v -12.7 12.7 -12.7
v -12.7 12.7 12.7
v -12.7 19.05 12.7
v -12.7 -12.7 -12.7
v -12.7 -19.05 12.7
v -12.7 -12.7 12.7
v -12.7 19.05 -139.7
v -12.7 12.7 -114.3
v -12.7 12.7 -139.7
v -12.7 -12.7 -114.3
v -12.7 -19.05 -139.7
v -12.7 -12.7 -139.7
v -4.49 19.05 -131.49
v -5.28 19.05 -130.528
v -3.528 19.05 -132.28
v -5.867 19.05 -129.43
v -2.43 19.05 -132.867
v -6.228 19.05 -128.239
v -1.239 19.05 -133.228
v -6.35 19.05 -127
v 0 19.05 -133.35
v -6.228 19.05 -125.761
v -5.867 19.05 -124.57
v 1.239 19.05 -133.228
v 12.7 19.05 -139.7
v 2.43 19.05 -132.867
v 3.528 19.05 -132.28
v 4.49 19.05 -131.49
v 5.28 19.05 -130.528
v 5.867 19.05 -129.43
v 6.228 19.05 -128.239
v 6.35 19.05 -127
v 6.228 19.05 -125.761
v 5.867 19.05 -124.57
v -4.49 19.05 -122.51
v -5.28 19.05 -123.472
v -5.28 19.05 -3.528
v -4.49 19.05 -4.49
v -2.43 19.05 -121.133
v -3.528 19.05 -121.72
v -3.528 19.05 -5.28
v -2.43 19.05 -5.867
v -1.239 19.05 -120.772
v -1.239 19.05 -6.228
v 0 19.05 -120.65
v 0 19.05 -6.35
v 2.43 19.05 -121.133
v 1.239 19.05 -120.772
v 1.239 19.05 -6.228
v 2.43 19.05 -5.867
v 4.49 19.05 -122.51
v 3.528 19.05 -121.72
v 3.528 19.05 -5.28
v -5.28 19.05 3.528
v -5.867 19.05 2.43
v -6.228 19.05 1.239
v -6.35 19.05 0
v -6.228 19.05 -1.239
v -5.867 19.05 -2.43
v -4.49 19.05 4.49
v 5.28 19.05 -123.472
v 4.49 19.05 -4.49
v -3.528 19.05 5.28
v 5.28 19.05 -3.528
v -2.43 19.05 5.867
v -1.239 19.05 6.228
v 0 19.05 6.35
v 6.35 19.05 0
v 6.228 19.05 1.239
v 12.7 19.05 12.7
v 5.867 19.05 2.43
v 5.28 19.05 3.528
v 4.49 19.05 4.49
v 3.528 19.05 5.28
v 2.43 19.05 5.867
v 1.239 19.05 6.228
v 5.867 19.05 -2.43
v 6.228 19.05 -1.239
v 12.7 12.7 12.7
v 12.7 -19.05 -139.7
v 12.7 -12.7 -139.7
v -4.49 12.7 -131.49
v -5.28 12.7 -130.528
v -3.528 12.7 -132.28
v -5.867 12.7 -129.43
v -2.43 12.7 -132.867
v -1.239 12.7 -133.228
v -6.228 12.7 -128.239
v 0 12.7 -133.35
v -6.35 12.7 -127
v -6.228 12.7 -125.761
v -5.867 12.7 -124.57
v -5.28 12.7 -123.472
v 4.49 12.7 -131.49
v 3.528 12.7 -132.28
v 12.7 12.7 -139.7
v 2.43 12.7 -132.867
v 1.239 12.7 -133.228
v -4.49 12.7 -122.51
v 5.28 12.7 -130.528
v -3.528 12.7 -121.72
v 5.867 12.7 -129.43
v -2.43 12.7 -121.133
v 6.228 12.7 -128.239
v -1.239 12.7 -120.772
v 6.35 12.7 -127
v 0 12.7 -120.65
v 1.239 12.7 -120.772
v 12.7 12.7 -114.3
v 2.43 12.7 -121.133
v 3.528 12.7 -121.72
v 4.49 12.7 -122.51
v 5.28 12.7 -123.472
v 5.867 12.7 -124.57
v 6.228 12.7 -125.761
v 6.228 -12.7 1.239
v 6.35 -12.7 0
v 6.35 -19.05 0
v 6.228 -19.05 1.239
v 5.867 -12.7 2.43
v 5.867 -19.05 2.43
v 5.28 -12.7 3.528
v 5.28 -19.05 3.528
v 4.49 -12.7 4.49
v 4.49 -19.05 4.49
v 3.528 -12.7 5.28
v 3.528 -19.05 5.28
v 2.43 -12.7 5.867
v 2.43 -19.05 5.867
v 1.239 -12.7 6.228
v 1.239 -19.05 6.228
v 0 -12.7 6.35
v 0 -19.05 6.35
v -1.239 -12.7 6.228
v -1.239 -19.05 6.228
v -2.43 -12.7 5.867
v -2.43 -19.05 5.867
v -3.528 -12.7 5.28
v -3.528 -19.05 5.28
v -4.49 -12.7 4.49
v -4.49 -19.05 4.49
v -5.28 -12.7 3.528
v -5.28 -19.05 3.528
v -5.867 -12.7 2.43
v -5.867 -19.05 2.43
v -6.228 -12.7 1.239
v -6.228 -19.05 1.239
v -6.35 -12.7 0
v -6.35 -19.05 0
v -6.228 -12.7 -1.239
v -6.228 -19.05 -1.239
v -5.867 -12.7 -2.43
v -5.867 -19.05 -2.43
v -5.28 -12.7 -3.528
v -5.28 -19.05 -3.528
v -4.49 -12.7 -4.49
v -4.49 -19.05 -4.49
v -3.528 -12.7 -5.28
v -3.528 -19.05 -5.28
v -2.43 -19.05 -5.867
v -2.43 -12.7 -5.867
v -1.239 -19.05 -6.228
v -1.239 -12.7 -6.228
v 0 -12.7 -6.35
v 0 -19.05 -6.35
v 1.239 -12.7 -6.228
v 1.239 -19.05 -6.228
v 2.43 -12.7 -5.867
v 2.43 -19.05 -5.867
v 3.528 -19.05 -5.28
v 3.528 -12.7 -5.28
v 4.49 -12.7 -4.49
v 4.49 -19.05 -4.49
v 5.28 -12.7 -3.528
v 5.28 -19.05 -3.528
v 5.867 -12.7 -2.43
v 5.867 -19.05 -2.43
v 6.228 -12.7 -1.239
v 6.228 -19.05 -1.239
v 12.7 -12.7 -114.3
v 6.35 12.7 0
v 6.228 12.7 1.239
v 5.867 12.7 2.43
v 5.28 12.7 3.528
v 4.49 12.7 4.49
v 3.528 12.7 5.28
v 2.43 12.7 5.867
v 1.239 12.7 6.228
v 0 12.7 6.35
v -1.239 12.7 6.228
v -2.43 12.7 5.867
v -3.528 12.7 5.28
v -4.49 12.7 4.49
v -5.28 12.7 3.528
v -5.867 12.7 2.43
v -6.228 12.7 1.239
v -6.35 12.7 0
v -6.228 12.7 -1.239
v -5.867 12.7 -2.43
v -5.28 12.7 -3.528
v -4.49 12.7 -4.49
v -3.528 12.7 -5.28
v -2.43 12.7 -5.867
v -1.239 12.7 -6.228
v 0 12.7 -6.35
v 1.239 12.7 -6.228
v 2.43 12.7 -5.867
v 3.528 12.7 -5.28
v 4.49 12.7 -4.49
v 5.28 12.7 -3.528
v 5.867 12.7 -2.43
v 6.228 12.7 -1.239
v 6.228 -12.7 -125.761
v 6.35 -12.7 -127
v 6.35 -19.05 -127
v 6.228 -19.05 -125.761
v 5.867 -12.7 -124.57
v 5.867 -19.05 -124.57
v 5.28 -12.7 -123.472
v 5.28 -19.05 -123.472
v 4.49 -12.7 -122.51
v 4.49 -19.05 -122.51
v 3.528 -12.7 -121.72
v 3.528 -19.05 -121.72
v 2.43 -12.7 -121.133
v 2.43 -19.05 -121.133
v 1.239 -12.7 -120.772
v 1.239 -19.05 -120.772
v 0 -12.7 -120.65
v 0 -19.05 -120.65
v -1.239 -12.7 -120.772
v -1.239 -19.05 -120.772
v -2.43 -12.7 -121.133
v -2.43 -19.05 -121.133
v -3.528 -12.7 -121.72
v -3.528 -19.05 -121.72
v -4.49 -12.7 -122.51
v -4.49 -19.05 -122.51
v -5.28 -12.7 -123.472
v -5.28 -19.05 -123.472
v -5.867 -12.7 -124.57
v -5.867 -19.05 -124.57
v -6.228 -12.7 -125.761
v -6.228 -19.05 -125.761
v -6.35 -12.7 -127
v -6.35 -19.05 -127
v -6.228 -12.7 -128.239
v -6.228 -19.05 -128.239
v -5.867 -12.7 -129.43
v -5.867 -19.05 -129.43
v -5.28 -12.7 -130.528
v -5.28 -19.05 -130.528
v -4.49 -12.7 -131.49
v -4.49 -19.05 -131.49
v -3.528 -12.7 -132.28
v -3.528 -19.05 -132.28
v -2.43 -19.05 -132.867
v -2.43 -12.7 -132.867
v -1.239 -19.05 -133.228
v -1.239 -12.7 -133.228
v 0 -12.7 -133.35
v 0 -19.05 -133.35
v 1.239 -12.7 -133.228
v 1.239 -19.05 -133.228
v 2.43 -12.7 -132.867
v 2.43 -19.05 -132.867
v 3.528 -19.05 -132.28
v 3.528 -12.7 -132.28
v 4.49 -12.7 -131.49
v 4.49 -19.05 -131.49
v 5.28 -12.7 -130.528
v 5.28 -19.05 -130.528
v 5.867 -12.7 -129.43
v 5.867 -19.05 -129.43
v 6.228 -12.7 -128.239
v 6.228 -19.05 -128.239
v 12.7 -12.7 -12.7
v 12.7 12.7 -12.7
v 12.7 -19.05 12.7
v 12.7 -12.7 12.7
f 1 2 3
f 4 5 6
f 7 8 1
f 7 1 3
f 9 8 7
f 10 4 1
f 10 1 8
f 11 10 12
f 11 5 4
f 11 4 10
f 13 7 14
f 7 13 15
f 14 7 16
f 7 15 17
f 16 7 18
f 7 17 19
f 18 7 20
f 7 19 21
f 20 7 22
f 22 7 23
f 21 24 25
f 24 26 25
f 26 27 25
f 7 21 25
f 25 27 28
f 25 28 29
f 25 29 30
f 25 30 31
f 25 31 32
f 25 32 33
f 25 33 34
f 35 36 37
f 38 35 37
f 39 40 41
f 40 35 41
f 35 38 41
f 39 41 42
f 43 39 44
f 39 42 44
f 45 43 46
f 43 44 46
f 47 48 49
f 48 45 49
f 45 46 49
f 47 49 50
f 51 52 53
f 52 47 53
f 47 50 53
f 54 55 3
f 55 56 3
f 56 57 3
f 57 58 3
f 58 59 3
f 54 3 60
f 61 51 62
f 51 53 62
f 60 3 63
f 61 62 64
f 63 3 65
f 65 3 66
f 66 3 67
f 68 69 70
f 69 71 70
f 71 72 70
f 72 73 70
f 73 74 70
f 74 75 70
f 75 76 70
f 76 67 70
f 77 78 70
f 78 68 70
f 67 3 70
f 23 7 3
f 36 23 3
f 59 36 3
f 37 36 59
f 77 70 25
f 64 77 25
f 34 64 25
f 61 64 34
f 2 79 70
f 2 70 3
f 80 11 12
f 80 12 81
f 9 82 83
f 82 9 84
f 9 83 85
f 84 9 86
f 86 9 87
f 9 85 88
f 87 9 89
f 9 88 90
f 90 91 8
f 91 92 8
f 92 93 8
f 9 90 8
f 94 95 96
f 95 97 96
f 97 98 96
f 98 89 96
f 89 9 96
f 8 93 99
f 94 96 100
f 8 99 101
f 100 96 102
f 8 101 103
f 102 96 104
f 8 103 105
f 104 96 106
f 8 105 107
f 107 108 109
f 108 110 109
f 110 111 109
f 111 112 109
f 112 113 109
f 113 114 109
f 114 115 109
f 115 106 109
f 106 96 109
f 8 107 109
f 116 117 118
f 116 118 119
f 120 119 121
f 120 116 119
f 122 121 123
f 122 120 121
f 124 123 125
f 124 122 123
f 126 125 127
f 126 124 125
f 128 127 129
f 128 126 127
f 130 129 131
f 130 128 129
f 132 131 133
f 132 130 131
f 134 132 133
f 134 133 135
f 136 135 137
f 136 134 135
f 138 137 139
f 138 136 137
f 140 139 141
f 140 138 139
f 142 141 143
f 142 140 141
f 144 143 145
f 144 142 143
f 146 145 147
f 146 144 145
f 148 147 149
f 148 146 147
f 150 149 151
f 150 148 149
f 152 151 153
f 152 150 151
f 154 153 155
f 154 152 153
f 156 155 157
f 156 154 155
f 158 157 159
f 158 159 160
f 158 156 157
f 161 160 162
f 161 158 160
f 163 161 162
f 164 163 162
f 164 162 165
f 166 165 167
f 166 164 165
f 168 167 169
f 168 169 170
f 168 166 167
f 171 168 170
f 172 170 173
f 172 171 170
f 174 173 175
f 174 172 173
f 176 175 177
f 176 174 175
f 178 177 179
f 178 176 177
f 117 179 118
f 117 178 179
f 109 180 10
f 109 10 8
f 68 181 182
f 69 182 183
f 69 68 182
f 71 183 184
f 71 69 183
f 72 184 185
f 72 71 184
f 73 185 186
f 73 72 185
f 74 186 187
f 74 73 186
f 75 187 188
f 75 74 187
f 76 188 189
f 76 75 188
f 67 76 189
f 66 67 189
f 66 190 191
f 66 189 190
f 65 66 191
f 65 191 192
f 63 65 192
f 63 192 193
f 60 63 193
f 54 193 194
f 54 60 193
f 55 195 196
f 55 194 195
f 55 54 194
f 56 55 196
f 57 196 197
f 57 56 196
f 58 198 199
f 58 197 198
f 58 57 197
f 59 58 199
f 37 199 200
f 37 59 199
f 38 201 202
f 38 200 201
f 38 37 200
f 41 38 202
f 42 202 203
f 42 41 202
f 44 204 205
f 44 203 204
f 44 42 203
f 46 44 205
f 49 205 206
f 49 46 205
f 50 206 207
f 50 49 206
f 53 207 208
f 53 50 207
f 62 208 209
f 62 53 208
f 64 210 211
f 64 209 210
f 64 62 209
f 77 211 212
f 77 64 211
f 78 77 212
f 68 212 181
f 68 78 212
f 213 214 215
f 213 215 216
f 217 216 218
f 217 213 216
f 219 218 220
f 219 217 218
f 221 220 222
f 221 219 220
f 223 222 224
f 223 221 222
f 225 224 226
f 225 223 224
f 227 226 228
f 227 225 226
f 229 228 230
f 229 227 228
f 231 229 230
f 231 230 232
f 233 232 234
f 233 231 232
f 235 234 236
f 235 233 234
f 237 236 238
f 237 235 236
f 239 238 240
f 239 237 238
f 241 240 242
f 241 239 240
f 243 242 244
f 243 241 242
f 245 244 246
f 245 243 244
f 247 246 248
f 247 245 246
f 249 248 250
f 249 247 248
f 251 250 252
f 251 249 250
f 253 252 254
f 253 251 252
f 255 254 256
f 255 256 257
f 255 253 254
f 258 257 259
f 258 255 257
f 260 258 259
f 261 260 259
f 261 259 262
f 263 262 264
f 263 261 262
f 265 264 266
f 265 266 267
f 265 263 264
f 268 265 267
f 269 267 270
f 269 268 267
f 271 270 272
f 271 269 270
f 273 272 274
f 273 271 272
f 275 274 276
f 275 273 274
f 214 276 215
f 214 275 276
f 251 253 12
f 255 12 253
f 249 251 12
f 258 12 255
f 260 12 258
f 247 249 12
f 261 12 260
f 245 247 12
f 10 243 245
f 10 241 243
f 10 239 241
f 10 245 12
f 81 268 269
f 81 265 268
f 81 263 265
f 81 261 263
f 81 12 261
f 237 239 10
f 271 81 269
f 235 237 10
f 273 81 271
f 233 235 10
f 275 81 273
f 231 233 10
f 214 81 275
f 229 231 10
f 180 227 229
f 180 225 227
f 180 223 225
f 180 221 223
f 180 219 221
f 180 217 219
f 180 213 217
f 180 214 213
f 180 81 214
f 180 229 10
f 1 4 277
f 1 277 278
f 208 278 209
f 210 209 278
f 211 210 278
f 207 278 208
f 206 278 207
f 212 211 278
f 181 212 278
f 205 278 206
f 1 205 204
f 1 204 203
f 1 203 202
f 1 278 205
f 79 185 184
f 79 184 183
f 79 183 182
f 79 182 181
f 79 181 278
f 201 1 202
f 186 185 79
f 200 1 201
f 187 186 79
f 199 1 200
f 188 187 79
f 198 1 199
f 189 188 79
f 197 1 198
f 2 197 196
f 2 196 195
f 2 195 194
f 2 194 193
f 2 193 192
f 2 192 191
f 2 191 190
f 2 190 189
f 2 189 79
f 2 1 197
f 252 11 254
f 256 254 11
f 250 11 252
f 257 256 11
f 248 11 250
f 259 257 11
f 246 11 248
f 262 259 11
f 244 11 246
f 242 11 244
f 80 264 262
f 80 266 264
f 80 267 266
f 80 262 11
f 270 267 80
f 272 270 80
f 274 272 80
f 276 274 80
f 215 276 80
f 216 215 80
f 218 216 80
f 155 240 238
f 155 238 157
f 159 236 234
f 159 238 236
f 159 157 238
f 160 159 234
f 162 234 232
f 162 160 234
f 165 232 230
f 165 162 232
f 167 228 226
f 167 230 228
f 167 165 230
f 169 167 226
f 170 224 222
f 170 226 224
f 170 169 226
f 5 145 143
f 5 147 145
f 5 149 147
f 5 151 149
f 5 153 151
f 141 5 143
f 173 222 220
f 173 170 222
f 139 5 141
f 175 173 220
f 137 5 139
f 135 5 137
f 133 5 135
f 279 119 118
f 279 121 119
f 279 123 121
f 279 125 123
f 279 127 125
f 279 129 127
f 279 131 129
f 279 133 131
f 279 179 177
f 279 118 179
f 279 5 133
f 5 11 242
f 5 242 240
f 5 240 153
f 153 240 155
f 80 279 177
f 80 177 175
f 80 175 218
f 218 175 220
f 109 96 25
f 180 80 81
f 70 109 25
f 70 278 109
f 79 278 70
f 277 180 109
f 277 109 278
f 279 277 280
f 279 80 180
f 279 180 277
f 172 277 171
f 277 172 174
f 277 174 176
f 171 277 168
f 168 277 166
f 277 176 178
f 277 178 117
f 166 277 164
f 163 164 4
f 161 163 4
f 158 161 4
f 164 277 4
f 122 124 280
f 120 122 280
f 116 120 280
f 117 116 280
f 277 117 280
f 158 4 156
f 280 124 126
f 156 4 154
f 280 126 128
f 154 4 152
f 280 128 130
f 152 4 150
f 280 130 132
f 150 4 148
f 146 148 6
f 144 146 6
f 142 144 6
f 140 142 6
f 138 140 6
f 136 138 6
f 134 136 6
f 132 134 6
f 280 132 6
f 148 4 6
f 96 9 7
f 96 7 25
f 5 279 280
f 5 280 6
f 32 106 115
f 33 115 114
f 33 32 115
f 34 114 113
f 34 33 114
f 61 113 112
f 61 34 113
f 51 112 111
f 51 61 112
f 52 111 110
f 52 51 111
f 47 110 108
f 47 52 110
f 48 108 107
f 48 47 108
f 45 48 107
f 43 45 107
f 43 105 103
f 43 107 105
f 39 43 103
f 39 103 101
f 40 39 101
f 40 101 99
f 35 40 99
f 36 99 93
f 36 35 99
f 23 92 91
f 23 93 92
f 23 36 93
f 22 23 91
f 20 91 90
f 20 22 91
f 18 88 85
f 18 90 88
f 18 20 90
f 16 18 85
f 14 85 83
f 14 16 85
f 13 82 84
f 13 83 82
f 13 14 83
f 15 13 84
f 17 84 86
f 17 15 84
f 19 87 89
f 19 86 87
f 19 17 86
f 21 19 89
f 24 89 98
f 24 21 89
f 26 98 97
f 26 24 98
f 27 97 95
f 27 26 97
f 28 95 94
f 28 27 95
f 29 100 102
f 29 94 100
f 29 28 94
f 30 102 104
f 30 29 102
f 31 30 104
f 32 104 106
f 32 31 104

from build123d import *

# Parameters (mm, degrees)
F0_R     = 6.35
F1_DEPTH = 19.05
F2_W     = 25.4
F2_H     = 25.4
F3_DEPTH = 25.4


with BuildPart() as f1:
    # F0 (on Front) → F1 (new body, symmetric)
    with BuildSketch(Plane.XZ):
        with BuildLine():
            ThreePointArc((0, -12.7), (8.9802561211, -8.9802561211), (12.7, 0))
            ThreePointArc((12.7, 0), (8.9802561211, 8.9802561211), (0, 12.7))
            ThreePointArc((0, 12.7), (-8.9802561211, 8.9802561211), (-12.7, 0))
            ThreePointArc((-12.7, 0), (-8.9802561211, -8.9802561211), (0, -12.7))
        make_face()
        Circle(F0_R, mode=Mode.SUBTRACT)
        with BuildLine():
            Line((12.7, -12.7), (12.7, 0))
            ThreePointArc((12.7, 0), (8.9802561211, -8.9802561211), (0, -12.7))
            Line((0, -12.7), (12.7, -12.7))
        make_face()
        with BuildLine():
            ThreePointArc((0, 12.7), (8.9802561211, 8.9802561211), (12.7, 0))
            Line((12.7, 0), (12.7, 12.7))
            Line((12.7, 12.7), (0, 12.7))
        make_face()
        with BuildLine():
            ThreePointArc((-12.7, 0), (-8.9802561211, 8.9802561211), (0, 12.7))
            Line((0, 12.7), (-12.7, 12.7))
            Line((-12.7, 12.7), (-12.7, 0))
        make_face()
        with BuildLine():
            Line((-12.7, -12.7), (0, -12.7))
            ThreePointArc((0, -12.7), (-8.9802561211, -8.9802561211), (-12.7, 0))
            Line((-12.7, 0), (-12.7, -12.7))
        make_face()
        Polygon((12.7, -12.7), (0, -12.7), (-12.7, -12.7), (-12.7, -114.3), (0, -114.3), (12.7, -114.3), align=None)
        with BuildLine():
            Line((12.7, -127), (12.7, -114.3))
            Line((12.7, -114.3), (0, -114.3))
            ThreePointArc((0, -114.3), (8.9802561211, -118.0197438789), (12.7, -127))
        make_face()
        with BuildLine():
            Line((0, -114.3), (-12.7, -114.3))
            Line((-12.7, -114.3), (-12.7, -127))
            ThreePointArc((-12.7, -127), (-8.9802561211, -118.0197438789), (0, -114.3))
        make_face()
        with BuildLine():
            ThreePointArc((0, -139.7), (8.9802561211, -135.9802561211), (12.7, -127))
            ThreePointArc((12.7, -127), (8.9802561211, -118.0197438789), (0, -114.3))
            ThreePointArc((0, -114.3), (-8.9802561211, -118.0197438789), (-12.7, -127))
            ThreePointArc((-12.7, -127), (-8.9802561211, -135.9802561211), (0, -139.7))
        make_face()
        with Locations((0, -127)):
            Circle(F0_R, mode=Mode.SUBTRACT)
        with BuildLine():
            Line((12.7, -139.7), (12.7, -127))
            ThreePointArc((12.7, -127), (8.9802561211, -135.9802561211), (0, -139.7))
            Line((0, -139.7), (12.7, -139.7))
        make_face()
        with BuildLine():
            ThreePointArc((0, -139.7), (-8.9802561211, -135.9802561211), (-12.7, -127))
            Line((-12.7, -127), (-12.7, -139.7))
            Line((-12.7, -139.7), (0, -139.7))
        make_face()
    extrude(amount=F1_DEPTH, both=True)

    # F2 (on Right) → F3 (cut, symmetric)
    with BuildSketch(Plane.YZ):
        Rectangle(F2_W, F2_H)
        with Locations((0, -127)):
            Rectangle(F2_W, F2_H)
    extrude(amount=F3_DEPTH, both=True, mode=Mode.SUBTRACT)


solid = f1.part
